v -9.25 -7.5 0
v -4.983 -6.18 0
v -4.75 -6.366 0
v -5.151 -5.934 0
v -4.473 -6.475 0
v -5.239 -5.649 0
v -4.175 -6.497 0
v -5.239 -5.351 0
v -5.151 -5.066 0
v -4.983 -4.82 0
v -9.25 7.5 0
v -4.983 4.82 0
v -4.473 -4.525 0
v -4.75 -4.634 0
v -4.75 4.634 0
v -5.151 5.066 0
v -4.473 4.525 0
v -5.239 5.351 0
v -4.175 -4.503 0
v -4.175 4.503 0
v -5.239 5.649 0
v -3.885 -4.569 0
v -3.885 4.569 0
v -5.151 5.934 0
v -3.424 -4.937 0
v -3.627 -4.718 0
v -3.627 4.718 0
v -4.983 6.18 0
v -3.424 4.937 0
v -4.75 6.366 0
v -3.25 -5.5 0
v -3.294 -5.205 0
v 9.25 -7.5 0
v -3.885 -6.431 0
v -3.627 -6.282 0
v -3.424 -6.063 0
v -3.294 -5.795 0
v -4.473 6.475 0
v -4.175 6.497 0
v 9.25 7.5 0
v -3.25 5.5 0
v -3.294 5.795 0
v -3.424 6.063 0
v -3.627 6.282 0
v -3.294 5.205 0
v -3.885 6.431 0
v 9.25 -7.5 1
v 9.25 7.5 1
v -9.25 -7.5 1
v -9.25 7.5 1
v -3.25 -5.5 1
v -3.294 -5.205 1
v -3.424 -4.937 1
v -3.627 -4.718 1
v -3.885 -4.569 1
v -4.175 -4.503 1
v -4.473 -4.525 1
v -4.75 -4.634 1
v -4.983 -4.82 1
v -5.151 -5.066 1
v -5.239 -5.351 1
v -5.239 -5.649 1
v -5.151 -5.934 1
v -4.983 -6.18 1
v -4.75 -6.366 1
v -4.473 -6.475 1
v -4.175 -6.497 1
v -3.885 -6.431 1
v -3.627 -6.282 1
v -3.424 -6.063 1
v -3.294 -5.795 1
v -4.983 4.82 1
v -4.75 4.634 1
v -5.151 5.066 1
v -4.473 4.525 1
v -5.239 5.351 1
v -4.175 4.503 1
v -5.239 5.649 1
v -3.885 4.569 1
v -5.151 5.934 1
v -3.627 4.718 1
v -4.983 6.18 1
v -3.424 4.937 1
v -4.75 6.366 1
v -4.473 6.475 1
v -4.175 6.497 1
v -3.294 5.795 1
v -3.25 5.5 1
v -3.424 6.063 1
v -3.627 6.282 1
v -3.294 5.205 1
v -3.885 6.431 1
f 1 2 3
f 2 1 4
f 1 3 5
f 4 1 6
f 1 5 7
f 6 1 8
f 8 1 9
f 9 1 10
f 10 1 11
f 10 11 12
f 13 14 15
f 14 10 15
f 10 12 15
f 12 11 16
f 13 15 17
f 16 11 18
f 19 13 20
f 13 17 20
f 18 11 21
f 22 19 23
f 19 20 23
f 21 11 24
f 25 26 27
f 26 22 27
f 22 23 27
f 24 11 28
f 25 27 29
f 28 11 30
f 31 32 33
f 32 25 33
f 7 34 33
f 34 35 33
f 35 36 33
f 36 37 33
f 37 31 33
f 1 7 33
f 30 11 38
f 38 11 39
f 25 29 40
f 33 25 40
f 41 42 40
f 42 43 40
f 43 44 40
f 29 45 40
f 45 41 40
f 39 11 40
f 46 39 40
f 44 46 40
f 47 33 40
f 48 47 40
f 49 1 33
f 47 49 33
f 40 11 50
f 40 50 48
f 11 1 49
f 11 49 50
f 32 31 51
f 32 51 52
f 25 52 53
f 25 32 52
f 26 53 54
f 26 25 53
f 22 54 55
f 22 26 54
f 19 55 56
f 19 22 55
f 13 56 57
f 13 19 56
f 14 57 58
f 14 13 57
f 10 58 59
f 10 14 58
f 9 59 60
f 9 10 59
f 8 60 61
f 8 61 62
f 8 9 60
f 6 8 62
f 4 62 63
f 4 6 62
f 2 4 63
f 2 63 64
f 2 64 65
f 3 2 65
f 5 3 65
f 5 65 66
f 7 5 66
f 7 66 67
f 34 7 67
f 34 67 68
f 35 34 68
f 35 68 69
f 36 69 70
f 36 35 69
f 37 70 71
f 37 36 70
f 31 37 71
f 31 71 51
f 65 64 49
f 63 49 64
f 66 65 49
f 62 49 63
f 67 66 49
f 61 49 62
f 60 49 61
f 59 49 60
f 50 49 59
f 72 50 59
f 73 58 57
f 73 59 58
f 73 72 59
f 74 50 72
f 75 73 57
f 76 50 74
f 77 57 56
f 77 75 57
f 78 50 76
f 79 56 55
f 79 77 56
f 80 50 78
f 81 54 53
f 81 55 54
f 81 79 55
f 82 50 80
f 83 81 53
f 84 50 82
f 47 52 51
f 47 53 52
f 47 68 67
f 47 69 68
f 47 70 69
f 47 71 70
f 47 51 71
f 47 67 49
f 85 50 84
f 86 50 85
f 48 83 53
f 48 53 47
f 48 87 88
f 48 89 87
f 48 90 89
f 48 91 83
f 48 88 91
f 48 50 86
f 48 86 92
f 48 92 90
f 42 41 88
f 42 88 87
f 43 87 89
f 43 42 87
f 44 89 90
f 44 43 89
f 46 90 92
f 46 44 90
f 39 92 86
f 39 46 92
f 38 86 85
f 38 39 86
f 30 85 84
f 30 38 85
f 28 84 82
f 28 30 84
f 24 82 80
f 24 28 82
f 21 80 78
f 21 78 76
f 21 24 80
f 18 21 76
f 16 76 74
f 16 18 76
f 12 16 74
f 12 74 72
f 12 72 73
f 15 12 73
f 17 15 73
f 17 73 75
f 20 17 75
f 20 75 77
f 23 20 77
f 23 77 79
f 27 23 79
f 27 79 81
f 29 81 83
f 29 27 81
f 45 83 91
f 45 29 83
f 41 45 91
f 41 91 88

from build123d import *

# Parameters (mm, degrees)
PCB_W               = 18.5
PCB_H               = 15
PCB_R               = 1
BOSS_EXTRUDE1_DEPTH = 1


with BuildPart() as part:
    # PCB → Boss-Extrude1 (new body)
    with BuildSketch(Plane.XY):
        Rectangle(PCB_W, PCB_H)
        with Locations((-4.25, 5.5)):
            Circle(PCB_R, mode=Mode.SUBTRACT)
        with Locations((-4.25, -5.5)):
            Circle(PCB_R, mode=Mode.SUBTRACT)
    extrude(amount=BOSS_EXTRUDE1_DEPTH)


solid = part.part
